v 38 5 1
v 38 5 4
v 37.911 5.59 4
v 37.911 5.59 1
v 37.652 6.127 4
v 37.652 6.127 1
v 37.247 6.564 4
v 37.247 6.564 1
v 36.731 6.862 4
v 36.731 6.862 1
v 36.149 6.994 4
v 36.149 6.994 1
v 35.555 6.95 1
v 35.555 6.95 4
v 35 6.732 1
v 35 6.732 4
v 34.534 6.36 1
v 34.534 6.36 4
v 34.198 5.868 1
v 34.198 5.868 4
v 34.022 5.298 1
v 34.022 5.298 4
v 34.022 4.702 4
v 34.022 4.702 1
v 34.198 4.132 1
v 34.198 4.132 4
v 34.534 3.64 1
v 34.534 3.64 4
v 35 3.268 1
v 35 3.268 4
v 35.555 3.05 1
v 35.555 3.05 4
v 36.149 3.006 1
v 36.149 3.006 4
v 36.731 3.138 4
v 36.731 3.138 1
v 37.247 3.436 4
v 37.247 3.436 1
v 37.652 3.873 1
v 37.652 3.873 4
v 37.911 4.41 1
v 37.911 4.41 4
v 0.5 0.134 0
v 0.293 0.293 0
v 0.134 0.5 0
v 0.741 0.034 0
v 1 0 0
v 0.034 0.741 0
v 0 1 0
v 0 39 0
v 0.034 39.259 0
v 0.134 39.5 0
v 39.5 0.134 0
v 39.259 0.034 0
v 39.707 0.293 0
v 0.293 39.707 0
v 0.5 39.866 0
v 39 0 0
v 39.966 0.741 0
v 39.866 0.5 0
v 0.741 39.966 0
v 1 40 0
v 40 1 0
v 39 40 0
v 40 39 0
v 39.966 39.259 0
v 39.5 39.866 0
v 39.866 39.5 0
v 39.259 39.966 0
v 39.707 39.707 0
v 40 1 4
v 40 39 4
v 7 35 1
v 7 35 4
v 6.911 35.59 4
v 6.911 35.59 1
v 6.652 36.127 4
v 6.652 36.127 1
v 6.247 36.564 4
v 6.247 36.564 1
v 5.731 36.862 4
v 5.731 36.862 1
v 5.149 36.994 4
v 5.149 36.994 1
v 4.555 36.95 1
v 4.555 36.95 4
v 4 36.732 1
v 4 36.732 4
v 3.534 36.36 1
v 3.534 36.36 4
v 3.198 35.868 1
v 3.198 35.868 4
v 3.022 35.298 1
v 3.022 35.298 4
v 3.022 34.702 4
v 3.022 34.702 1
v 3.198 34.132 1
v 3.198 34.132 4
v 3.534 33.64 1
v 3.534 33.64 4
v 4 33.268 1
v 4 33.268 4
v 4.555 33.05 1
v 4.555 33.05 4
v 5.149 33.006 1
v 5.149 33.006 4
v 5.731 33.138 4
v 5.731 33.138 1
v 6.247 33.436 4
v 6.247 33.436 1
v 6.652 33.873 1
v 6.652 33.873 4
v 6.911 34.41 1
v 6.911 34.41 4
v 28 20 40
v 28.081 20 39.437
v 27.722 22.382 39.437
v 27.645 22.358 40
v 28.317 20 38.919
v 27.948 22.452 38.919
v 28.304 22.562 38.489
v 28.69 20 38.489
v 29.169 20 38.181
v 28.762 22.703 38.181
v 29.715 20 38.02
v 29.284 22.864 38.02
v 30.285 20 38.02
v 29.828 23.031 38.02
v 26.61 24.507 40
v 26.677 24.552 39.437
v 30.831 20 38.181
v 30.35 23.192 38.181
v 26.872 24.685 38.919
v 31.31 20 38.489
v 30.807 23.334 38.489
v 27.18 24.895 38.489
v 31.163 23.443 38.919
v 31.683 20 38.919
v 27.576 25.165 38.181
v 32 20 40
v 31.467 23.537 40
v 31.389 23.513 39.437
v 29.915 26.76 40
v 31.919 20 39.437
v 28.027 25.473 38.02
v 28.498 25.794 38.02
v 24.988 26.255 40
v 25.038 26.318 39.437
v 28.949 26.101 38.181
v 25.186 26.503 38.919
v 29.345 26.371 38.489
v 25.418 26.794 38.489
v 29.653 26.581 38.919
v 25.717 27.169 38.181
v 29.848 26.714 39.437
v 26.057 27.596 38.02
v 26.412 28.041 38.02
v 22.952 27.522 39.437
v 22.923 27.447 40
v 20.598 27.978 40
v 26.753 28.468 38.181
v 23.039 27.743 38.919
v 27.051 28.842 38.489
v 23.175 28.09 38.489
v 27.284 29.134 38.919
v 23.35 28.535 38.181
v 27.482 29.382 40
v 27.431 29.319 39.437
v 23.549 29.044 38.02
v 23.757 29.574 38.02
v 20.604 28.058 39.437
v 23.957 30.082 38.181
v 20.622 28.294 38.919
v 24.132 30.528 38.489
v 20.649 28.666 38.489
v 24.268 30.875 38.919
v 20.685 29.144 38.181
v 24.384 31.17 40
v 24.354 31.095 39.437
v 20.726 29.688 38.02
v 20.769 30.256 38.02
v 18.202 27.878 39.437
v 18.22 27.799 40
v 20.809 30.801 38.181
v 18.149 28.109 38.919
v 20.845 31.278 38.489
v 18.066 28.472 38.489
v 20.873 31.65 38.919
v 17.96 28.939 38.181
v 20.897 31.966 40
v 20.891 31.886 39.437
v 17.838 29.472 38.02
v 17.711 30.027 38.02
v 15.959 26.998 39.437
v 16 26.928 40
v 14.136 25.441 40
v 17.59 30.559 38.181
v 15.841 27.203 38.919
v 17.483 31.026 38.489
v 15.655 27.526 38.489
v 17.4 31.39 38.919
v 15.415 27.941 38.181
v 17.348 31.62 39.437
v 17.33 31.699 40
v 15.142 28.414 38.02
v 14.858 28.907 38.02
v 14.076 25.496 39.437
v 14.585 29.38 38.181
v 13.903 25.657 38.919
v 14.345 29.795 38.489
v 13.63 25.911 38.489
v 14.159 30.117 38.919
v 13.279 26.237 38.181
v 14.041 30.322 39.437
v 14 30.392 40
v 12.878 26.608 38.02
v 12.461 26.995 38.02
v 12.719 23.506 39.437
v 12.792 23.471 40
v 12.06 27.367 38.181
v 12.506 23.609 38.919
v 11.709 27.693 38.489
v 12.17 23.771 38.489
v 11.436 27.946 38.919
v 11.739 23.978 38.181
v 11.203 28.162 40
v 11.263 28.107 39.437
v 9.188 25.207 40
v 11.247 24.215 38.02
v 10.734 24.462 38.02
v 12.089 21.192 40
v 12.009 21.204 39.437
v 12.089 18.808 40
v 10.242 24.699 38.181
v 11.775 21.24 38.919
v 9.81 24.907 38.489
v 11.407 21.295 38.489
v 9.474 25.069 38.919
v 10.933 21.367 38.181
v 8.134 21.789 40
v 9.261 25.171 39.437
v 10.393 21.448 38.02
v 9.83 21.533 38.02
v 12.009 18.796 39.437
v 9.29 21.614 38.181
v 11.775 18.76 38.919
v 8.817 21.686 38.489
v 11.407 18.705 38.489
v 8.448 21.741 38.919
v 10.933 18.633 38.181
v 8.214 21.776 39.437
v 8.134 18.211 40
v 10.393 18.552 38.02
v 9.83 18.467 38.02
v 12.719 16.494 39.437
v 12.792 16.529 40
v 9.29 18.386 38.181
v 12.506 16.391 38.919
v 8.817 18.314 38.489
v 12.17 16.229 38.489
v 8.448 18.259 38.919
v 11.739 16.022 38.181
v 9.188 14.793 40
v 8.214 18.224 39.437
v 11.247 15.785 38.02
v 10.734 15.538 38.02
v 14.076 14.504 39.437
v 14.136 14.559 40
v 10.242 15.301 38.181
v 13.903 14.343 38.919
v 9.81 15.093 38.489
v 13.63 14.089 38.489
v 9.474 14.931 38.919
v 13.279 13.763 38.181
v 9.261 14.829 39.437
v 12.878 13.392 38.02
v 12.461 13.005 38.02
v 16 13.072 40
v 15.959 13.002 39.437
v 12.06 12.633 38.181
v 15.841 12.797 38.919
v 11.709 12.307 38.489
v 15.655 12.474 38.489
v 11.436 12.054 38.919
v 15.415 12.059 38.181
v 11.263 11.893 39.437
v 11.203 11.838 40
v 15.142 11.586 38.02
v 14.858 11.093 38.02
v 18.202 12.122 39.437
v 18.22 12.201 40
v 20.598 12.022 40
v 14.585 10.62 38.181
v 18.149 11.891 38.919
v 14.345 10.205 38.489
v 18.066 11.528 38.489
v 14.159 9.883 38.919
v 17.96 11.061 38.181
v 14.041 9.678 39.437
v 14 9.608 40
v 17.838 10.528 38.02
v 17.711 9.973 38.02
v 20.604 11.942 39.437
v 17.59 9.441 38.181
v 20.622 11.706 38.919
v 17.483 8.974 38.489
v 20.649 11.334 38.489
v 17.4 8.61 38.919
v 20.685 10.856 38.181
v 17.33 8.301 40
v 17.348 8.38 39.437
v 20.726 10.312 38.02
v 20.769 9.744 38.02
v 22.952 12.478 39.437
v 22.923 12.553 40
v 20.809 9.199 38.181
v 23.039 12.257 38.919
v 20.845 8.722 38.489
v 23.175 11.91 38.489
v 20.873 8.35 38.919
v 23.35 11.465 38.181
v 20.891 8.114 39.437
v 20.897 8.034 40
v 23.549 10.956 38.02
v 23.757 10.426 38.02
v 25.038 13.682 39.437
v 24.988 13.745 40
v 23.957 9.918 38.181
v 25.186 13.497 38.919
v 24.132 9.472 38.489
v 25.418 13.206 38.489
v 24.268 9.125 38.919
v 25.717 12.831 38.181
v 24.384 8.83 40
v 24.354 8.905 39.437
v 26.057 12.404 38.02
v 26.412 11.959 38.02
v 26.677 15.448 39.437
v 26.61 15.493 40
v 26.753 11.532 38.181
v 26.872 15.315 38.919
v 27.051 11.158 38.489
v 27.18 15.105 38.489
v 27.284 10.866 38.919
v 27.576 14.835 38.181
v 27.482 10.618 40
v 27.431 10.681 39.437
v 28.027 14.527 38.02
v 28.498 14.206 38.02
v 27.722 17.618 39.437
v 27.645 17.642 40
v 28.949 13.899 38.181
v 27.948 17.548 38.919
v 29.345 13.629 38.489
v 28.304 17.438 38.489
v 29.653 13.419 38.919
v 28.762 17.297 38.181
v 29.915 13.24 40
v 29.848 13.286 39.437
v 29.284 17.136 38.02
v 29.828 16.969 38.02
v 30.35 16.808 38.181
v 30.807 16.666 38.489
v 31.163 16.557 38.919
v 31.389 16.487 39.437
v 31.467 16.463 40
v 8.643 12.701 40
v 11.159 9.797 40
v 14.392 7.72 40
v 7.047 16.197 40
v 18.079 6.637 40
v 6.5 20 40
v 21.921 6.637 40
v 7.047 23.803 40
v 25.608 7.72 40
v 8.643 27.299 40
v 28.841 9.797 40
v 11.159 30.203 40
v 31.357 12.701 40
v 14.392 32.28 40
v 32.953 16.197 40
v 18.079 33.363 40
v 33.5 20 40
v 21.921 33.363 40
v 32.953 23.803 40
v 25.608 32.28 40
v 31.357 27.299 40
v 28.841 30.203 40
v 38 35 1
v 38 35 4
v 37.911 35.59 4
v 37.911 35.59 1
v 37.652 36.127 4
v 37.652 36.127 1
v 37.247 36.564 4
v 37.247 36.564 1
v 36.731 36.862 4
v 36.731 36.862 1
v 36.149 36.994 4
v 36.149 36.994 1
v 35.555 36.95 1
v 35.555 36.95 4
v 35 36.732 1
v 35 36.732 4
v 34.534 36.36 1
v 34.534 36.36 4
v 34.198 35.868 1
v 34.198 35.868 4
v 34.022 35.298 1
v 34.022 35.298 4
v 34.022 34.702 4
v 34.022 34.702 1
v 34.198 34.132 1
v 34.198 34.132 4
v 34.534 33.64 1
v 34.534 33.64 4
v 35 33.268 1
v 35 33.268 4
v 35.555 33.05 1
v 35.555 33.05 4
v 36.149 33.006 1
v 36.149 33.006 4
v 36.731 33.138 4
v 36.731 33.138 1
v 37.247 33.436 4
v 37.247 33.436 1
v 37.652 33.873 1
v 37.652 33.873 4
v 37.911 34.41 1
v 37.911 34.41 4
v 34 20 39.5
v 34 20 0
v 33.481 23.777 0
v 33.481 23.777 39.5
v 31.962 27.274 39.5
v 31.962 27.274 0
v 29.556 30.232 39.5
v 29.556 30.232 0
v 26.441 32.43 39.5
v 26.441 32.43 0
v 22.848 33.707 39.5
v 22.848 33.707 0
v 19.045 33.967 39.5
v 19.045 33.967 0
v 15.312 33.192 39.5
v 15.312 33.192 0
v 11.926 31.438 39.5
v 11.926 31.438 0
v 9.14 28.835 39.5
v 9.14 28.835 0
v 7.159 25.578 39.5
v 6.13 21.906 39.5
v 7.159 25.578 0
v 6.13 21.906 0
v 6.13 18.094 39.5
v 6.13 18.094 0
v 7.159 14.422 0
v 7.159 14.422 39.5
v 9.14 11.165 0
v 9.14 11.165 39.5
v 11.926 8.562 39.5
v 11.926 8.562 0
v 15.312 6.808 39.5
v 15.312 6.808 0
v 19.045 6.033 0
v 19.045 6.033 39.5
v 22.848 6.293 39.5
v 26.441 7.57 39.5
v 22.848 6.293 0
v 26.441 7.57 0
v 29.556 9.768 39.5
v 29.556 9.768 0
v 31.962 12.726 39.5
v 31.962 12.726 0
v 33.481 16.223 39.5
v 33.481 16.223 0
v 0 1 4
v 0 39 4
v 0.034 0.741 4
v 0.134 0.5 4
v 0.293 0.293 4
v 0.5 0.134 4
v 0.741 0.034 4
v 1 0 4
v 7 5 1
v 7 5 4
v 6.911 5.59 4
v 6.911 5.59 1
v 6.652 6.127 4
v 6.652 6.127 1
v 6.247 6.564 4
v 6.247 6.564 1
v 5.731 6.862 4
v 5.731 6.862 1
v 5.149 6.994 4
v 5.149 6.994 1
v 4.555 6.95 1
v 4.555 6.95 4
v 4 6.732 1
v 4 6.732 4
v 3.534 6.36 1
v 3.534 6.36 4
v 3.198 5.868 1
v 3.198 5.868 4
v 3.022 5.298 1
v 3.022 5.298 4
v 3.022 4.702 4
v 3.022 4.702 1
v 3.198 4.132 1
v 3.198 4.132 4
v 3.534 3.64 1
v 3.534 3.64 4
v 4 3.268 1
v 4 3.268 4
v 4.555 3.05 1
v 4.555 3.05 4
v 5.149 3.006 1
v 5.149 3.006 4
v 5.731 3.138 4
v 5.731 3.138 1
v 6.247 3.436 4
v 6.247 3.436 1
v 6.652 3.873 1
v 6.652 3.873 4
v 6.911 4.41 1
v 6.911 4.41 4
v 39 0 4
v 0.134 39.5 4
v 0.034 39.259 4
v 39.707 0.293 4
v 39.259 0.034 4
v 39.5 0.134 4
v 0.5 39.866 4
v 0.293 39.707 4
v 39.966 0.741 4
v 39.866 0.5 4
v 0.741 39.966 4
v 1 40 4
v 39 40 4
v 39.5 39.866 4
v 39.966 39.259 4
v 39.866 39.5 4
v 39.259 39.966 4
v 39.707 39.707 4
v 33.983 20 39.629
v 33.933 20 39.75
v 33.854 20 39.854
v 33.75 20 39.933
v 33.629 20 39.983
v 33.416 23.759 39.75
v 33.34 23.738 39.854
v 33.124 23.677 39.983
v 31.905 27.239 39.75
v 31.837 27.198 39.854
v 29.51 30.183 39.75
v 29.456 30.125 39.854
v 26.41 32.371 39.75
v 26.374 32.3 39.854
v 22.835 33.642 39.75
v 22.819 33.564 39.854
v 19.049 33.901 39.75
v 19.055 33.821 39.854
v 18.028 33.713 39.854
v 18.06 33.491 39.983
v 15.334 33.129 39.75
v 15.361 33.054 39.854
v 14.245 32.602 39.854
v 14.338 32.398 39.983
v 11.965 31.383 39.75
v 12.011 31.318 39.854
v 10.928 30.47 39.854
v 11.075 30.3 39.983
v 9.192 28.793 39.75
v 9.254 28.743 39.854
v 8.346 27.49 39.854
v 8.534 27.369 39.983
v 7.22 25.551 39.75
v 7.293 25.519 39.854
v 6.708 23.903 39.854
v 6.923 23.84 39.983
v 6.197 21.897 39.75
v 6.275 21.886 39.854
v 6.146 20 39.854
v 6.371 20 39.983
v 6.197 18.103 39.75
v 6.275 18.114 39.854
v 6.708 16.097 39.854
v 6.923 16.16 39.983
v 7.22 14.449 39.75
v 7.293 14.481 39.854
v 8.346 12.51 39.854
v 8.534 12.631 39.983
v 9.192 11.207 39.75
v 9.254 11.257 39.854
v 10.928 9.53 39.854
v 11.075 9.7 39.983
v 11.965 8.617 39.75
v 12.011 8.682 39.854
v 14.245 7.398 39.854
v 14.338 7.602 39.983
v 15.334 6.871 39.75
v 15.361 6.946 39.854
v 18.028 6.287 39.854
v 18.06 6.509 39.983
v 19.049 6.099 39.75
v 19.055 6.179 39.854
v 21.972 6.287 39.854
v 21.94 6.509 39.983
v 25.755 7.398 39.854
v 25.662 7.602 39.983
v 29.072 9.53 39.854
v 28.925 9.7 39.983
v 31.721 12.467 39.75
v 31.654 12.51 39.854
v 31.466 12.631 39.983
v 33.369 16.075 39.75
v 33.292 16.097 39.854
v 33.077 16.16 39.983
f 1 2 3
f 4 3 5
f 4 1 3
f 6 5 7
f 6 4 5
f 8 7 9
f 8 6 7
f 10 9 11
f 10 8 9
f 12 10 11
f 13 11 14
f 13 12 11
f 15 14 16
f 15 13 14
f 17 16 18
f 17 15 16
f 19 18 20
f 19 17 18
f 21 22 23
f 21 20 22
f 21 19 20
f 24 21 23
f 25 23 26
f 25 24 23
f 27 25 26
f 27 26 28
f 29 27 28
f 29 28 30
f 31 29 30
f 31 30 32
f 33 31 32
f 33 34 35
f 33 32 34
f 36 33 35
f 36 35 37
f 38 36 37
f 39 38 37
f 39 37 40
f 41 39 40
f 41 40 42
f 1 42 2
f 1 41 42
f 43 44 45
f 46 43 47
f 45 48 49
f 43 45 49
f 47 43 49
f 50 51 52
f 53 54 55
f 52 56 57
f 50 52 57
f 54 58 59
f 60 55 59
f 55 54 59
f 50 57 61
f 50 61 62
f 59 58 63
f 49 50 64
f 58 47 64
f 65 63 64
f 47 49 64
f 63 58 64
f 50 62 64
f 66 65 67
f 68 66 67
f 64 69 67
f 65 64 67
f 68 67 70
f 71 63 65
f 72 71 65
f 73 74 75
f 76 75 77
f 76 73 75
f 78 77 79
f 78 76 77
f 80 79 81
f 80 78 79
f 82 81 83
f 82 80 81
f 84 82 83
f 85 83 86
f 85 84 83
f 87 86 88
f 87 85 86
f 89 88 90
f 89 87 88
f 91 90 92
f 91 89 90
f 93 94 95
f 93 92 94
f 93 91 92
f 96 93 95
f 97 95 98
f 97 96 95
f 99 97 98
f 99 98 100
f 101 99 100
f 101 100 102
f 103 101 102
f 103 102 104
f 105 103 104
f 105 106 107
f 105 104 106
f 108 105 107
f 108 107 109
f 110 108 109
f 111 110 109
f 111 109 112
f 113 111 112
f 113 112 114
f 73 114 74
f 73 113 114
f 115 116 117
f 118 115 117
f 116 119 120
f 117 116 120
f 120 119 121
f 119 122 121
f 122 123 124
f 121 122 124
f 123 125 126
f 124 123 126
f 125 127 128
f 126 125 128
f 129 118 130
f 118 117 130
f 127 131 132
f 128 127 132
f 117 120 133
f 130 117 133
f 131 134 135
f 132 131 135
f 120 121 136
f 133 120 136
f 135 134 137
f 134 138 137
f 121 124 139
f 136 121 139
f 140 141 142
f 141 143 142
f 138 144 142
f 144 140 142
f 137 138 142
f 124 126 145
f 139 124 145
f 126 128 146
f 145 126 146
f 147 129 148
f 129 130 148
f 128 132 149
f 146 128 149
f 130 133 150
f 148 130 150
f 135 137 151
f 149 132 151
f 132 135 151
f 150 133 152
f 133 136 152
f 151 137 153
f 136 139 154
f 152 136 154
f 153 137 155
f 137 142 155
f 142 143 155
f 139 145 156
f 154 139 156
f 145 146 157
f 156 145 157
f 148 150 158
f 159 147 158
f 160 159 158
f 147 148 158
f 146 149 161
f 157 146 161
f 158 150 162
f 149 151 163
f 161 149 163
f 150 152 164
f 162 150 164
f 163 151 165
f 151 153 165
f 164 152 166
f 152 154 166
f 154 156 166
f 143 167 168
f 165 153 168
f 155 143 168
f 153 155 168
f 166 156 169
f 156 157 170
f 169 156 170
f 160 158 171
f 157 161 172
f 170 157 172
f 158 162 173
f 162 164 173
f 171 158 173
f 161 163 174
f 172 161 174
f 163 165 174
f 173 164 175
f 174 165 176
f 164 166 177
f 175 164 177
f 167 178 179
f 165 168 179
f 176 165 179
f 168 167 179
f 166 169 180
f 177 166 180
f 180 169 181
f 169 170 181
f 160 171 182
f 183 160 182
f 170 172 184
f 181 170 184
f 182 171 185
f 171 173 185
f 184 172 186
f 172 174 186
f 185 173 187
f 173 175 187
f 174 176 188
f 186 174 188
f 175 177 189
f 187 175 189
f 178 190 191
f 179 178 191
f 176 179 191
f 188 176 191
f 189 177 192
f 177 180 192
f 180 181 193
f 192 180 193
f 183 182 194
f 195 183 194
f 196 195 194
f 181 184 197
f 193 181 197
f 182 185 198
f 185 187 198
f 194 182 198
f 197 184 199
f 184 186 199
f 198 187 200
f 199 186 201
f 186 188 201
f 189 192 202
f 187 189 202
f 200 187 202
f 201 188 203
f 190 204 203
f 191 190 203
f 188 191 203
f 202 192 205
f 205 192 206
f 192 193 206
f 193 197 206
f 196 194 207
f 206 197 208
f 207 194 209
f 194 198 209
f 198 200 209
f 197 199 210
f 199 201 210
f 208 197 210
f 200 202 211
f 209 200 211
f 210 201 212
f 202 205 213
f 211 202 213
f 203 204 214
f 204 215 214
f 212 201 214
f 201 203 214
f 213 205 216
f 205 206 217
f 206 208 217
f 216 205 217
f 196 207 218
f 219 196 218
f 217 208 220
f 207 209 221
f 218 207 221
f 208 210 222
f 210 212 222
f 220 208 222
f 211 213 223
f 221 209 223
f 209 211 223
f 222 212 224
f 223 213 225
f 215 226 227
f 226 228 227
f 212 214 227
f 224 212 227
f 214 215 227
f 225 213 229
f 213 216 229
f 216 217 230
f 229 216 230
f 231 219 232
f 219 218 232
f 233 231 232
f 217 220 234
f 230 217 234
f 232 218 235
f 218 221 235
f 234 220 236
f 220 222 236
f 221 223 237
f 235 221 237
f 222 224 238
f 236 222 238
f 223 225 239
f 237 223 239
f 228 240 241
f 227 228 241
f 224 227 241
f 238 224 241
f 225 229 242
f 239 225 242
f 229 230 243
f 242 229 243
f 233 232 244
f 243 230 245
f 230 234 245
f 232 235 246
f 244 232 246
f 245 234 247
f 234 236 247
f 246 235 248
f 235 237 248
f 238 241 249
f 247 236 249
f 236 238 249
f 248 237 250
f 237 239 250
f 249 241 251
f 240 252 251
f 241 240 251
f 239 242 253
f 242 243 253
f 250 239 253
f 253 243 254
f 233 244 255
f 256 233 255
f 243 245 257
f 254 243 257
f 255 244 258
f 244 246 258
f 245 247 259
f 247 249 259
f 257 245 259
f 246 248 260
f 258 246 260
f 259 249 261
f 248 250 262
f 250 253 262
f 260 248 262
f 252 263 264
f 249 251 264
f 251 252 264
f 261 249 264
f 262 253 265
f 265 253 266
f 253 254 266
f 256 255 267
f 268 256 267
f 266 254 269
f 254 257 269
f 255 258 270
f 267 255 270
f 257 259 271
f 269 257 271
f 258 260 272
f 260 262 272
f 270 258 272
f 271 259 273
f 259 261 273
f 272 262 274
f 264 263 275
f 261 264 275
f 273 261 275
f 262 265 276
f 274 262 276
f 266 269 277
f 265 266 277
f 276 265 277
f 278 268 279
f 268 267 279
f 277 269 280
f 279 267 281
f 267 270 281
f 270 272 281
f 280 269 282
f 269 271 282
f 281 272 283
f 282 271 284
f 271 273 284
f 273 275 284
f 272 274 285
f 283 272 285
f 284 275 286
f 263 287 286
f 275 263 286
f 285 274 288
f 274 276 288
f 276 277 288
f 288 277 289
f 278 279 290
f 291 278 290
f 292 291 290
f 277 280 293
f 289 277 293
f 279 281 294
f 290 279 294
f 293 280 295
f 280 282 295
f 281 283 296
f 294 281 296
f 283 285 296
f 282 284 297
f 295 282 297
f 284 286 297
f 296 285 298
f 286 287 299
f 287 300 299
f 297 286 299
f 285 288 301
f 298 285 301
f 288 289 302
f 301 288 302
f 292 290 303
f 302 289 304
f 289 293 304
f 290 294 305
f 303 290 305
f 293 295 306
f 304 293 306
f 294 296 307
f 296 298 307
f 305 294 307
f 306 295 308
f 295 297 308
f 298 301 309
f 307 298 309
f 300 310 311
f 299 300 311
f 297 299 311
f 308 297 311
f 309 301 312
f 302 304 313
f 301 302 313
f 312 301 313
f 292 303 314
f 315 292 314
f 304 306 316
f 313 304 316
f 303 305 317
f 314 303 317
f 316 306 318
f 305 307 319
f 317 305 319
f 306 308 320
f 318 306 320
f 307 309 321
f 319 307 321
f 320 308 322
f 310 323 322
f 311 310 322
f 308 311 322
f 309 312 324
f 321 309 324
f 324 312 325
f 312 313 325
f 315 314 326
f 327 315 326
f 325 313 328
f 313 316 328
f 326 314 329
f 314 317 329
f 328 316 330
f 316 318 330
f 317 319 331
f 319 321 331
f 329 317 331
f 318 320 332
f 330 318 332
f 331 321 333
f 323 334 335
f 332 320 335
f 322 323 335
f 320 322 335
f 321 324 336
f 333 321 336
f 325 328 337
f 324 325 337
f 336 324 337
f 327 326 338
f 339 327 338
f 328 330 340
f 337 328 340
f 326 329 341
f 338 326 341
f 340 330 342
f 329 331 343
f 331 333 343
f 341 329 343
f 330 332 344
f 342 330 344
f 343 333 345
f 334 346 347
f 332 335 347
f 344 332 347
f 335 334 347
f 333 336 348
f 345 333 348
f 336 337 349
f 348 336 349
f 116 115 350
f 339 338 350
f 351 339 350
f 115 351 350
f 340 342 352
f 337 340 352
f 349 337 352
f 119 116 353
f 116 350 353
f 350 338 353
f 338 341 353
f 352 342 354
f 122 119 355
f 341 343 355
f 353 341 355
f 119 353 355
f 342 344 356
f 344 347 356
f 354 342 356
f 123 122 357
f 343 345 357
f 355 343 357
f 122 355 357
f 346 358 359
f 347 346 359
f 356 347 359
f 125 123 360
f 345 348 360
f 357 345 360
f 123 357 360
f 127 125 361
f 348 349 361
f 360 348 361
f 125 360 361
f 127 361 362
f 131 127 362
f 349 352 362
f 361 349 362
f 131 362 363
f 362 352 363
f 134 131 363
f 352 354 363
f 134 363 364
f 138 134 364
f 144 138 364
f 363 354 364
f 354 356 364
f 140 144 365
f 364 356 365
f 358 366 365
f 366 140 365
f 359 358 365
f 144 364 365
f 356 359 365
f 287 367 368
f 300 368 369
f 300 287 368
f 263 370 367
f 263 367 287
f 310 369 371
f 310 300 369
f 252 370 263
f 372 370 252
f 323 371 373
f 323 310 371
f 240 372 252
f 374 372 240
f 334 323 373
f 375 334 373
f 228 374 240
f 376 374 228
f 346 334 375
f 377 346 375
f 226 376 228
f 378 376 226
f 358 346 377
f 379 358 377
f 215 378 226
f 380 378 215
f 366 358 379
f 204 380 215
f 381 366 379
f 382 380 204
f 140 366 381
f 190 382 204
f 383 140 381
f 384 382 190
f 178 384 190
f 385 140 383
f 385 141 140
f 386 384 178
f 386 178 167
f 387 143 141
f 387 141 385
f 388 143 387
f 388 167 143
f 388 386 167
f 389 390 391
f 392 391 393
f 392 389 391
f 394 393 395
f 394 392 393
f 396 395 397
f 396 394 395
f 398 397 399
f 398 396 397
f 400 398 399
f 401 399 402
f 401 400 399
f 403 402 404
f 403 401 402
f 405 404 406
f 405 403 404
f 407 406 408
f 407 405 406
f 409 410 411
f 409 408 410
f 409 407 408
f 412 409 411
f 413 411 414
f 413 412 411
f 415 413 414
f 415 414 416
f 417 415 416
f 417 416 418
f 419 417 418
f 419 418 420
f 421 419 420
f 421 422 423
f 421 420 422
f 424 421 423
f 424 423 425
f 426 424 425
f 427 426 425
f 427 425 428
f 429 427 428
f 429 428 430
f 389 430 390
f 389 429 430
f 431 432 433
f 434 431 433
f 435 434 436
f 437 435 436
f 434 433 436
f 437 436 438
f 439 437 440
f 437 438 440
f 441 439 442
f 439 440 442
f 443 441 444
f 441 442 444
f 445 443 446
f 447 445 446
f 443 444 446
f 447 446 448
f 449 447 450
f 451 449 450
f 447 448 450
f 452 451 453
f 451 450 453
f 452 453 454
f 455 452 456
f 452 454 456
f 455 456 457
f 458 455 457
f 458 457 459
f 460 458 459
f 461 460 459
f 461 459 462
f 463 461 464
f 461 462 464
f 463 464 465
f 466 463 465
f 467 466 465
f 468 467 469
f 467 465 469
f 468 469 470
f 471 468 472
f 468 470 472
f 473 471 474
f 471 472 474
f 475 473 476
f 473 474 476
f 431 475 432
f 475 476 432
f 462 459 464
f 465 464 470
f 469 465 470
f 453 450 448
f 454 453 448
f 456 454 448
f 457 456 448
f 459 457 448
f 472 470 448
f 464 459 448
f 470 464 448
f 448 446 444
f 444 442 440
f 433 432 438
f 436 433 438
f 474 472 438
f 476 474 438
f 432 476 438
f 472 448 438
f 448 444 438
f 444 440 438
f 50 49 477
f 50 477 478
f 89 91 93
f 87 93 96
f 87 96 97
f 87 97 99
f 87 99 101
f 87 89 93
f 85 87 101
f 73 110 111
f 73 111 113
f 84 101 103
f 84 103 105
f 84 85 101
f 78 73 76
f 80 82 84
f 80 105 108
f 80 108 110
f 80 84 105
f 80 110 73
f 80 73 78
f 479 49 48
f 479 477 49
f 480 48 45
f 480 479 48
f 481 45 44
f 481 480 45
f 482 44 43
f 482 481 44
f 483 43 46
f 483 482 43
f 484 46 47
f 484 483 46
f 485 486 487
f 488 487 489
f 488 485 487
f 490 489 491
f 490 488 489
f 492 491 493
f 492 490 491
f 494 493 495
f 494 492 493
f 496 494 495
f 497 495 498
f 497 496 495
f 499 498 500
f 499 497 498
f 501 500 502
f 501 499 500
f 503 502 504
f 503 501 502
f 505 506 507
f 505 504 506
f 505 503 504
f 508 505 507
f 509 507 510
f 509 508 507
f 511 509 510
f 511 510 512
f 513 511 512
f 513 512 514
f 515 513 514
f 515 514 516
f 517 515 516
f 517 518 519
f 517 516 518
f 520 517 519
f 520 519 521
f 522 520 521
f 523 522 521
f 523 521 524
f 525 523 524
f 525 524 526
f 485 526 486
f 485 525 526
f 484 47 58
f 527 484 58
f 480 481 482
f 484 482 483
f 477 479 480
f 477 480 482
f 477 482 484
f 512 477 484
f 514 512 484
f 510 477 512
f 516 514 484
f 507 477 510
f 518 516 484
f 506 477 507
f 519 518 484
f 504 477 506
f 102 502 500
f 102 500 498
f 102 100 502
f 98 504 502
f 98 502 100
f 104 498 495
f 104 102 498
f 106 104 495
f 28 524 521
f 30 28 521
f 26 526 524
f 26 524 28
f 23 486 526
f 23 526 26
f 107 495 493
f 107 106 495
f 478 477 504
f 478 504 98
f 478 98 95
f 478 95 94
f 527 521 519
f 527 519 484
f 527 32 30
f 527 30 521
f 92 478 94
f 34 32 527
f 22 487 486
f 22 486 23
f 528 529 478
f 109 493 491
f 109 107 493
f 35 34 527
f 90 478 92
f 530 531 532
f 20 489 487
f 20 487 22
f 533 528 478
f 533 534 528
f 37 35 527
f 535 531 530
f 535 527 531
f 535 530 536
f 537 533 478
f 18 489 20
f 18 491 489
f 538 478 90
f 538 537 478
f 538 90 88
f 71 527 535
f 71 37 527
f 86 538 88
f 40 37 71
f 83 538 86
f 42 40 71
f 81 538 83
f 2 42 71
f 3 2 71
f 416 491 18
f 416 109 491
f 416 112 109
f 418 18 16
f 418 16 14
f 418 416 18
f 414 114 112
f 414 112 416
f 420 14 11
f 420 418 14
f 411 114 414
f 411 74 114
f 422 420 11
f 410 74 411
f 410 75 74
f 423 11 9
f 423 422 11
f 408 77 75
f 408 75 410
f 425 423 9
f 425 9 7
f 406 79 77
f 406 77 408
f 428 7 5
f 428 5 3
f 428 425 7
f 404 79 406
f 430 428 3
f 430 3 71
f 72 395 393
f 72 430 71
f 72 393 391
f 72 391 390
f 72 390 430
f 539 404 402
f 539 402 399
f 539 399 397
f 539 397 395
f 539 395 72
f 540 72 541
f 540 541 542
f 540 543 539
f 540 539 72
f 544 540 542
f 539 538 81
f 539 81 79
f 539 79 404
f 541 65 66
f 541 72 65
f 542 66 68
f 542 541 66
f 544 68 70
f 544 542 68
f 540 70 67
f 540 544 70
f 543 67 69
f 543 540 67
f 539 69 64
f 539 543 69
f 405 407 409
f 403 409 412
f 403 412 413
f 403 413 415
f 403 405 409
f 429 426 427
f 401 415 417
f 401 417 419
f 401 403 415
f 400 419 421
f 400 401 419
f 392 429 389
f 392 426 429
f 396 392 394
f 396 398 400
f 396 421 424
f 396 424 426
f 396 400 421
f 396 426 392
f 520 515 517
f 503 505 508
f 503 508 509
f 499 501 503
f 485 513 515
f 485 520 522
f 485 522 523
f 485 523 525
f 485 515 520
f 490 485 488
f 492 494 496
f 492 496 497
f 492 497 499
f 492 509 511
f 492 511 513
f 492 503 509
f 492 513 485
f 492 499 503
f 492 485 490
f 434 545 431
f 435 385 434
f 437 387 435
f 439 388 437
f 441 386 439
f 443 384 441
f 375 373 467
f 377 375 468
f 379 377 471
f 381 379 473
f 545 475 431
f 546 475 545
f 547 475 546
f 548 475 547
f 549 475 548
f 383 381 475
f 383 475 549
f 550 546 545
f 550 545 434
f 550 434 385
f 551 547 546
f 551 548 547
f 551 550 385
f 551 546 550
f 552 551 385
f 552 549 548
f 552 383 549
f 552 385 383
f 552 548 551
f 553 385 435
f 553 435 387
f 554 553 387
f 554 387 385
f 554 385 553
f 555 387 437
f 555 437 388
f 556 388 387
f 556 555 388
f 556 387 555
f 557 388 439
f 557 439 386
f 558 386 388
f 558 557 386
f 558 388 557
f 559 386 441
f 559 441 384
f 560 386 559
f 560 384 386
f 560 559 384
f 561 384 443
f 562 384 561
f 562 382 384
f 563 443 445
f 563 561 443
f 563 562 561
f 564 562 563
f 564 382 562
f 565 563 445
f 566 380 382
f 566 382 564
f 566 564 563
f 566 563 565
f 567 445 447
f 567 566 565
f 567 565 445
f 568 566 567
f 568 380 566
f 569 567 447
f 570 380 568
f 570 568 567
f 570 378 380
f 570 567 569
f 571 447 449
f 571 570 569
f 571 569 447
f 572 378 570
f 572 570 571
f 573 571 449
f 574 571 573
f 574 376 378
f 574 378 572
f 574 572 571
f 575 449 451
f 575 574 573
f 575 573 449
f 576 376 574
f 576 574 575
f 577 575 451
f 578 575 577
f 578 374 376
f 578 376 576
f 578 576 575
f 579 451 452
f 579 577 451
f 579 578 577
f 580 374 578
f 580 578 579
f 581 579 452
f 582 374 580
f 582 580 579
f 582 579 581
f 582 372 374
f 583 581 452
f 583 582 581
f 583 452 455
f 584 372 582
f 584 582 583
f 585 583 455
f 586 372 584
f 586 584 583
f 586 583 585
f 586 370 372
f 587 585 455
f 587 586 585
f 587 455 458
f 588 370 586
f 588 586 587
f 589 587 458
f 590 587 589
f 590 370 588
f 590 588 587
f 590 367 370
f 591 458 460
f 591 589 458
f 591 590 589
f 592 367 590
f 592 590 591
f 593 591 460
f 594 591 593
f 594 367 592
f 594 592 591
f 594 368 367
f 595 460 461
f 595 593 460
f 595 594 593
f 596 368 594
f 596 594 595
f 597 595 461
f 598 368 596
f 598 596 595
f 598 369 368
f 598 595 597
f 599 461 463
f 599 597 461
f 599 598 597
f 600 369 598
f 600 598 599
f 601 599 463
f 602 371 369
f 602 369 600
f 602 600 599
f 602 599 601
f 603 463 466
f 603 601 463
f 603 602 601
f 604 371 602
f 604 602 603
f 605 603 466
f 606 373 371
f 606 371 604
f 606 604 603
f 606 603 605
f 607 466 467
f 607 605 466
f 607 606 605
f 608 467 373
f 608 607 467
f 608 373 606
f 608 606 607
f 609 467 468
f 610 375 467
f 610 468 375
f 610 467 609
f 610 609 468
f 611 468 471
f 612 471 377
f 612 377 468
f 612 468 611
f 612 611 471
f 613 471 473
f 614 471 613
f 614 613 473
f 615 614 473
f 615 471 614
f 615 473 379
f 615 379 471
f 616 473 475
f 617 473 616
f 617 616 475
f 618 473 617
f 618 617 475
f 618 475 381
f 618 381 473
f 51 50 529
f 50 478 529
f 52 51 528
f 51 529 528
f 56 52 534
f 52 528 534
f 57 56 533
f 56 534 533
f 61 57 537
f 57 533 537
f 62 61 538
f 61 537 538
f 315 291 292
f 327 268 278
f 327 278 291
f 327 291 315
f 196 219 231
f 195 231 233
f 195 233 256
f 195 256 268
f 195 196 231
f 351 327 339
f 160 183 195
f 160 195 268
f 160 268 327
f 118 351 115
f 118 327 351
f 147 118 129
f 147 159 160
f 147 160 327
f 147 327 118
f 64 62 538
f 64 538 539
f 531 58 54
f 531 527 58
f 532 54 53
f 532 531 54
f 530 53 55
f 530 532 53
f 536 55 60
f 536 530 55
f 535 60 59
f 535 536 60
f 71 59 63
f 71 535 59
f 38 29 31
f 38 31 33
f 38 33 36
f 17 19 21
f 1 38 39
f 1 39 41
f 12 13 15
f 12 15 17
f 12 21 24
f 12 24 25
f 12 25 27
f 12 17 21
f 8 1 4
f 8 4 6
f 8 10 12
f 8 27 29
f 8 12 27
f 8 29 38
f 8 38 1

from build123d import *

# Parameters (mm, degrees)
TORUS_R           = 2
CYLINDER004_R     = 14
CYLINDER004_DEPTH = 40
FILLET001_R       = 0.5
CYLINDER003_R     = 2
CYLINDER003_DEPTH = 4
CYLINDER002_R     = 2
CYLINDER002_DEPTH = 4
CYLINDER001_R     = 2
CYLINDER001_DEPTH = 4
CYLINDER_R        = 2
CYLINDER_DEPTH    = 4
BOX_W             = 40
BOX_H             = 40
BOX_DEPTH         = 4
FILLET_R          = 1


with BuildPart() as torus:
    # Torus → Torus (revolve)
    with BuildSketch(Plane(origin=(20, 20, 40), x_dir=(1, 0, 0), z_dir=(0, -1, 0))):
        with Locations((10, 0)):
            Circle(TORUS_R)
    revolve(axis=Axis((20, 20, 40), (0, 0, 1)))


with BuildPart() as fillet001:
    # Cylinder004 → Cylinder004 (new body)
    with BuildSketch(Plane(origin=(20, 20, 0), x_dir=(1, 0, 0), z_dir=(0, 0, 1))):
        Circle(CYLINDER004_R)
    extrude(amount=CYLINDER004_DEPTH)

    # Cut: cut Torus
    add(torus.part, mode=Mode.SUBTRACT)

    # Fillet001
    fillet001_edges = [fillet001.edges().sort_by_distance(p)[0] for p in [
        (6, 20, 40),
    ]]
    fillet(fillet001_edges, radius=FILLET001_R)


with BuildPart() as cylinder003:
    # Cylinder003 → Cylinder003 (new body)
    with BuildSketch(Plane(origin=(36, 35, 1), x_dir=(1, 0, 0), z_dir=(0, 0, 1))):
        Circle(CYLINDER003_R)
    extrude(amount=CYLINDER003_DEPTH)


with BuildPart() as cylinder002:
    # Cylinder002 → Cylinder002 (new body)
    with BuildSketch(Plane(origin=(5, 35, 1), x_dir=(1, 0, 0), z_dir=(0, 0, 1))):
        Circle(CYLINDER002_R)
    extrude(amount=CYLINDER002_DEPTH)


with BuildPart() as cylinder001:
    # Cylinder001 → Cylinder001 (new body)
    with BuildSketch(Plane(origin=(5, 5, 1), x_dir=(1, 0, 0), z_dir=(0, 0, 1))):
        Circle(CYLINDER001_R)
    extrude(amount=CYLINDER001_DEPTH)


with BuildPart() as cylinder:
    # Cylinder → Cylinder (new body)
    with BuildSketch(Plane(origin=(36, 5, 1), x_dir=(1, 0, 0), z_dir=(0, 0, 1))):
        Circle(CYLINDER_R)
    extrude(amount=CYLINDER_DEPTH)


with BuildPart() as cut004:
    # Box → Box (new body)
    with BuildSketch(Plane.XY):
        with Locations((20, 20)):
            Rectangle(BOX_W, BOX_H)
    extrude(amount=BOX_DEPTH)

    # Fillet
    fillet_edges = [cut004.edges().sort_by_distance(p)[0] for p in [
        (0, 0, 2),
        (0, 40, 2),
        (40, 0, 2),
        (40, 40, 2),
    ]]
    fillet(fillet_edges, radius=FILLET_R)

    # Cut001: cut Cylinder
    add(cylinder.part, mode=Mode.SUBTRACT)

    # Cut002: cut Cylinder001
    add(cylinder001.part, mode=Mode.SUBTRACT)

    # Cut003: cut Cylinder002
    add(cylinder002.part, mode=Mode.SUBTRACT)

    # Cut004: cut Cylinder003
    add(cylinder003.part, mode=Mode.SUBTRACT)


solid = Compound([fillet001.part, cut004.part])
